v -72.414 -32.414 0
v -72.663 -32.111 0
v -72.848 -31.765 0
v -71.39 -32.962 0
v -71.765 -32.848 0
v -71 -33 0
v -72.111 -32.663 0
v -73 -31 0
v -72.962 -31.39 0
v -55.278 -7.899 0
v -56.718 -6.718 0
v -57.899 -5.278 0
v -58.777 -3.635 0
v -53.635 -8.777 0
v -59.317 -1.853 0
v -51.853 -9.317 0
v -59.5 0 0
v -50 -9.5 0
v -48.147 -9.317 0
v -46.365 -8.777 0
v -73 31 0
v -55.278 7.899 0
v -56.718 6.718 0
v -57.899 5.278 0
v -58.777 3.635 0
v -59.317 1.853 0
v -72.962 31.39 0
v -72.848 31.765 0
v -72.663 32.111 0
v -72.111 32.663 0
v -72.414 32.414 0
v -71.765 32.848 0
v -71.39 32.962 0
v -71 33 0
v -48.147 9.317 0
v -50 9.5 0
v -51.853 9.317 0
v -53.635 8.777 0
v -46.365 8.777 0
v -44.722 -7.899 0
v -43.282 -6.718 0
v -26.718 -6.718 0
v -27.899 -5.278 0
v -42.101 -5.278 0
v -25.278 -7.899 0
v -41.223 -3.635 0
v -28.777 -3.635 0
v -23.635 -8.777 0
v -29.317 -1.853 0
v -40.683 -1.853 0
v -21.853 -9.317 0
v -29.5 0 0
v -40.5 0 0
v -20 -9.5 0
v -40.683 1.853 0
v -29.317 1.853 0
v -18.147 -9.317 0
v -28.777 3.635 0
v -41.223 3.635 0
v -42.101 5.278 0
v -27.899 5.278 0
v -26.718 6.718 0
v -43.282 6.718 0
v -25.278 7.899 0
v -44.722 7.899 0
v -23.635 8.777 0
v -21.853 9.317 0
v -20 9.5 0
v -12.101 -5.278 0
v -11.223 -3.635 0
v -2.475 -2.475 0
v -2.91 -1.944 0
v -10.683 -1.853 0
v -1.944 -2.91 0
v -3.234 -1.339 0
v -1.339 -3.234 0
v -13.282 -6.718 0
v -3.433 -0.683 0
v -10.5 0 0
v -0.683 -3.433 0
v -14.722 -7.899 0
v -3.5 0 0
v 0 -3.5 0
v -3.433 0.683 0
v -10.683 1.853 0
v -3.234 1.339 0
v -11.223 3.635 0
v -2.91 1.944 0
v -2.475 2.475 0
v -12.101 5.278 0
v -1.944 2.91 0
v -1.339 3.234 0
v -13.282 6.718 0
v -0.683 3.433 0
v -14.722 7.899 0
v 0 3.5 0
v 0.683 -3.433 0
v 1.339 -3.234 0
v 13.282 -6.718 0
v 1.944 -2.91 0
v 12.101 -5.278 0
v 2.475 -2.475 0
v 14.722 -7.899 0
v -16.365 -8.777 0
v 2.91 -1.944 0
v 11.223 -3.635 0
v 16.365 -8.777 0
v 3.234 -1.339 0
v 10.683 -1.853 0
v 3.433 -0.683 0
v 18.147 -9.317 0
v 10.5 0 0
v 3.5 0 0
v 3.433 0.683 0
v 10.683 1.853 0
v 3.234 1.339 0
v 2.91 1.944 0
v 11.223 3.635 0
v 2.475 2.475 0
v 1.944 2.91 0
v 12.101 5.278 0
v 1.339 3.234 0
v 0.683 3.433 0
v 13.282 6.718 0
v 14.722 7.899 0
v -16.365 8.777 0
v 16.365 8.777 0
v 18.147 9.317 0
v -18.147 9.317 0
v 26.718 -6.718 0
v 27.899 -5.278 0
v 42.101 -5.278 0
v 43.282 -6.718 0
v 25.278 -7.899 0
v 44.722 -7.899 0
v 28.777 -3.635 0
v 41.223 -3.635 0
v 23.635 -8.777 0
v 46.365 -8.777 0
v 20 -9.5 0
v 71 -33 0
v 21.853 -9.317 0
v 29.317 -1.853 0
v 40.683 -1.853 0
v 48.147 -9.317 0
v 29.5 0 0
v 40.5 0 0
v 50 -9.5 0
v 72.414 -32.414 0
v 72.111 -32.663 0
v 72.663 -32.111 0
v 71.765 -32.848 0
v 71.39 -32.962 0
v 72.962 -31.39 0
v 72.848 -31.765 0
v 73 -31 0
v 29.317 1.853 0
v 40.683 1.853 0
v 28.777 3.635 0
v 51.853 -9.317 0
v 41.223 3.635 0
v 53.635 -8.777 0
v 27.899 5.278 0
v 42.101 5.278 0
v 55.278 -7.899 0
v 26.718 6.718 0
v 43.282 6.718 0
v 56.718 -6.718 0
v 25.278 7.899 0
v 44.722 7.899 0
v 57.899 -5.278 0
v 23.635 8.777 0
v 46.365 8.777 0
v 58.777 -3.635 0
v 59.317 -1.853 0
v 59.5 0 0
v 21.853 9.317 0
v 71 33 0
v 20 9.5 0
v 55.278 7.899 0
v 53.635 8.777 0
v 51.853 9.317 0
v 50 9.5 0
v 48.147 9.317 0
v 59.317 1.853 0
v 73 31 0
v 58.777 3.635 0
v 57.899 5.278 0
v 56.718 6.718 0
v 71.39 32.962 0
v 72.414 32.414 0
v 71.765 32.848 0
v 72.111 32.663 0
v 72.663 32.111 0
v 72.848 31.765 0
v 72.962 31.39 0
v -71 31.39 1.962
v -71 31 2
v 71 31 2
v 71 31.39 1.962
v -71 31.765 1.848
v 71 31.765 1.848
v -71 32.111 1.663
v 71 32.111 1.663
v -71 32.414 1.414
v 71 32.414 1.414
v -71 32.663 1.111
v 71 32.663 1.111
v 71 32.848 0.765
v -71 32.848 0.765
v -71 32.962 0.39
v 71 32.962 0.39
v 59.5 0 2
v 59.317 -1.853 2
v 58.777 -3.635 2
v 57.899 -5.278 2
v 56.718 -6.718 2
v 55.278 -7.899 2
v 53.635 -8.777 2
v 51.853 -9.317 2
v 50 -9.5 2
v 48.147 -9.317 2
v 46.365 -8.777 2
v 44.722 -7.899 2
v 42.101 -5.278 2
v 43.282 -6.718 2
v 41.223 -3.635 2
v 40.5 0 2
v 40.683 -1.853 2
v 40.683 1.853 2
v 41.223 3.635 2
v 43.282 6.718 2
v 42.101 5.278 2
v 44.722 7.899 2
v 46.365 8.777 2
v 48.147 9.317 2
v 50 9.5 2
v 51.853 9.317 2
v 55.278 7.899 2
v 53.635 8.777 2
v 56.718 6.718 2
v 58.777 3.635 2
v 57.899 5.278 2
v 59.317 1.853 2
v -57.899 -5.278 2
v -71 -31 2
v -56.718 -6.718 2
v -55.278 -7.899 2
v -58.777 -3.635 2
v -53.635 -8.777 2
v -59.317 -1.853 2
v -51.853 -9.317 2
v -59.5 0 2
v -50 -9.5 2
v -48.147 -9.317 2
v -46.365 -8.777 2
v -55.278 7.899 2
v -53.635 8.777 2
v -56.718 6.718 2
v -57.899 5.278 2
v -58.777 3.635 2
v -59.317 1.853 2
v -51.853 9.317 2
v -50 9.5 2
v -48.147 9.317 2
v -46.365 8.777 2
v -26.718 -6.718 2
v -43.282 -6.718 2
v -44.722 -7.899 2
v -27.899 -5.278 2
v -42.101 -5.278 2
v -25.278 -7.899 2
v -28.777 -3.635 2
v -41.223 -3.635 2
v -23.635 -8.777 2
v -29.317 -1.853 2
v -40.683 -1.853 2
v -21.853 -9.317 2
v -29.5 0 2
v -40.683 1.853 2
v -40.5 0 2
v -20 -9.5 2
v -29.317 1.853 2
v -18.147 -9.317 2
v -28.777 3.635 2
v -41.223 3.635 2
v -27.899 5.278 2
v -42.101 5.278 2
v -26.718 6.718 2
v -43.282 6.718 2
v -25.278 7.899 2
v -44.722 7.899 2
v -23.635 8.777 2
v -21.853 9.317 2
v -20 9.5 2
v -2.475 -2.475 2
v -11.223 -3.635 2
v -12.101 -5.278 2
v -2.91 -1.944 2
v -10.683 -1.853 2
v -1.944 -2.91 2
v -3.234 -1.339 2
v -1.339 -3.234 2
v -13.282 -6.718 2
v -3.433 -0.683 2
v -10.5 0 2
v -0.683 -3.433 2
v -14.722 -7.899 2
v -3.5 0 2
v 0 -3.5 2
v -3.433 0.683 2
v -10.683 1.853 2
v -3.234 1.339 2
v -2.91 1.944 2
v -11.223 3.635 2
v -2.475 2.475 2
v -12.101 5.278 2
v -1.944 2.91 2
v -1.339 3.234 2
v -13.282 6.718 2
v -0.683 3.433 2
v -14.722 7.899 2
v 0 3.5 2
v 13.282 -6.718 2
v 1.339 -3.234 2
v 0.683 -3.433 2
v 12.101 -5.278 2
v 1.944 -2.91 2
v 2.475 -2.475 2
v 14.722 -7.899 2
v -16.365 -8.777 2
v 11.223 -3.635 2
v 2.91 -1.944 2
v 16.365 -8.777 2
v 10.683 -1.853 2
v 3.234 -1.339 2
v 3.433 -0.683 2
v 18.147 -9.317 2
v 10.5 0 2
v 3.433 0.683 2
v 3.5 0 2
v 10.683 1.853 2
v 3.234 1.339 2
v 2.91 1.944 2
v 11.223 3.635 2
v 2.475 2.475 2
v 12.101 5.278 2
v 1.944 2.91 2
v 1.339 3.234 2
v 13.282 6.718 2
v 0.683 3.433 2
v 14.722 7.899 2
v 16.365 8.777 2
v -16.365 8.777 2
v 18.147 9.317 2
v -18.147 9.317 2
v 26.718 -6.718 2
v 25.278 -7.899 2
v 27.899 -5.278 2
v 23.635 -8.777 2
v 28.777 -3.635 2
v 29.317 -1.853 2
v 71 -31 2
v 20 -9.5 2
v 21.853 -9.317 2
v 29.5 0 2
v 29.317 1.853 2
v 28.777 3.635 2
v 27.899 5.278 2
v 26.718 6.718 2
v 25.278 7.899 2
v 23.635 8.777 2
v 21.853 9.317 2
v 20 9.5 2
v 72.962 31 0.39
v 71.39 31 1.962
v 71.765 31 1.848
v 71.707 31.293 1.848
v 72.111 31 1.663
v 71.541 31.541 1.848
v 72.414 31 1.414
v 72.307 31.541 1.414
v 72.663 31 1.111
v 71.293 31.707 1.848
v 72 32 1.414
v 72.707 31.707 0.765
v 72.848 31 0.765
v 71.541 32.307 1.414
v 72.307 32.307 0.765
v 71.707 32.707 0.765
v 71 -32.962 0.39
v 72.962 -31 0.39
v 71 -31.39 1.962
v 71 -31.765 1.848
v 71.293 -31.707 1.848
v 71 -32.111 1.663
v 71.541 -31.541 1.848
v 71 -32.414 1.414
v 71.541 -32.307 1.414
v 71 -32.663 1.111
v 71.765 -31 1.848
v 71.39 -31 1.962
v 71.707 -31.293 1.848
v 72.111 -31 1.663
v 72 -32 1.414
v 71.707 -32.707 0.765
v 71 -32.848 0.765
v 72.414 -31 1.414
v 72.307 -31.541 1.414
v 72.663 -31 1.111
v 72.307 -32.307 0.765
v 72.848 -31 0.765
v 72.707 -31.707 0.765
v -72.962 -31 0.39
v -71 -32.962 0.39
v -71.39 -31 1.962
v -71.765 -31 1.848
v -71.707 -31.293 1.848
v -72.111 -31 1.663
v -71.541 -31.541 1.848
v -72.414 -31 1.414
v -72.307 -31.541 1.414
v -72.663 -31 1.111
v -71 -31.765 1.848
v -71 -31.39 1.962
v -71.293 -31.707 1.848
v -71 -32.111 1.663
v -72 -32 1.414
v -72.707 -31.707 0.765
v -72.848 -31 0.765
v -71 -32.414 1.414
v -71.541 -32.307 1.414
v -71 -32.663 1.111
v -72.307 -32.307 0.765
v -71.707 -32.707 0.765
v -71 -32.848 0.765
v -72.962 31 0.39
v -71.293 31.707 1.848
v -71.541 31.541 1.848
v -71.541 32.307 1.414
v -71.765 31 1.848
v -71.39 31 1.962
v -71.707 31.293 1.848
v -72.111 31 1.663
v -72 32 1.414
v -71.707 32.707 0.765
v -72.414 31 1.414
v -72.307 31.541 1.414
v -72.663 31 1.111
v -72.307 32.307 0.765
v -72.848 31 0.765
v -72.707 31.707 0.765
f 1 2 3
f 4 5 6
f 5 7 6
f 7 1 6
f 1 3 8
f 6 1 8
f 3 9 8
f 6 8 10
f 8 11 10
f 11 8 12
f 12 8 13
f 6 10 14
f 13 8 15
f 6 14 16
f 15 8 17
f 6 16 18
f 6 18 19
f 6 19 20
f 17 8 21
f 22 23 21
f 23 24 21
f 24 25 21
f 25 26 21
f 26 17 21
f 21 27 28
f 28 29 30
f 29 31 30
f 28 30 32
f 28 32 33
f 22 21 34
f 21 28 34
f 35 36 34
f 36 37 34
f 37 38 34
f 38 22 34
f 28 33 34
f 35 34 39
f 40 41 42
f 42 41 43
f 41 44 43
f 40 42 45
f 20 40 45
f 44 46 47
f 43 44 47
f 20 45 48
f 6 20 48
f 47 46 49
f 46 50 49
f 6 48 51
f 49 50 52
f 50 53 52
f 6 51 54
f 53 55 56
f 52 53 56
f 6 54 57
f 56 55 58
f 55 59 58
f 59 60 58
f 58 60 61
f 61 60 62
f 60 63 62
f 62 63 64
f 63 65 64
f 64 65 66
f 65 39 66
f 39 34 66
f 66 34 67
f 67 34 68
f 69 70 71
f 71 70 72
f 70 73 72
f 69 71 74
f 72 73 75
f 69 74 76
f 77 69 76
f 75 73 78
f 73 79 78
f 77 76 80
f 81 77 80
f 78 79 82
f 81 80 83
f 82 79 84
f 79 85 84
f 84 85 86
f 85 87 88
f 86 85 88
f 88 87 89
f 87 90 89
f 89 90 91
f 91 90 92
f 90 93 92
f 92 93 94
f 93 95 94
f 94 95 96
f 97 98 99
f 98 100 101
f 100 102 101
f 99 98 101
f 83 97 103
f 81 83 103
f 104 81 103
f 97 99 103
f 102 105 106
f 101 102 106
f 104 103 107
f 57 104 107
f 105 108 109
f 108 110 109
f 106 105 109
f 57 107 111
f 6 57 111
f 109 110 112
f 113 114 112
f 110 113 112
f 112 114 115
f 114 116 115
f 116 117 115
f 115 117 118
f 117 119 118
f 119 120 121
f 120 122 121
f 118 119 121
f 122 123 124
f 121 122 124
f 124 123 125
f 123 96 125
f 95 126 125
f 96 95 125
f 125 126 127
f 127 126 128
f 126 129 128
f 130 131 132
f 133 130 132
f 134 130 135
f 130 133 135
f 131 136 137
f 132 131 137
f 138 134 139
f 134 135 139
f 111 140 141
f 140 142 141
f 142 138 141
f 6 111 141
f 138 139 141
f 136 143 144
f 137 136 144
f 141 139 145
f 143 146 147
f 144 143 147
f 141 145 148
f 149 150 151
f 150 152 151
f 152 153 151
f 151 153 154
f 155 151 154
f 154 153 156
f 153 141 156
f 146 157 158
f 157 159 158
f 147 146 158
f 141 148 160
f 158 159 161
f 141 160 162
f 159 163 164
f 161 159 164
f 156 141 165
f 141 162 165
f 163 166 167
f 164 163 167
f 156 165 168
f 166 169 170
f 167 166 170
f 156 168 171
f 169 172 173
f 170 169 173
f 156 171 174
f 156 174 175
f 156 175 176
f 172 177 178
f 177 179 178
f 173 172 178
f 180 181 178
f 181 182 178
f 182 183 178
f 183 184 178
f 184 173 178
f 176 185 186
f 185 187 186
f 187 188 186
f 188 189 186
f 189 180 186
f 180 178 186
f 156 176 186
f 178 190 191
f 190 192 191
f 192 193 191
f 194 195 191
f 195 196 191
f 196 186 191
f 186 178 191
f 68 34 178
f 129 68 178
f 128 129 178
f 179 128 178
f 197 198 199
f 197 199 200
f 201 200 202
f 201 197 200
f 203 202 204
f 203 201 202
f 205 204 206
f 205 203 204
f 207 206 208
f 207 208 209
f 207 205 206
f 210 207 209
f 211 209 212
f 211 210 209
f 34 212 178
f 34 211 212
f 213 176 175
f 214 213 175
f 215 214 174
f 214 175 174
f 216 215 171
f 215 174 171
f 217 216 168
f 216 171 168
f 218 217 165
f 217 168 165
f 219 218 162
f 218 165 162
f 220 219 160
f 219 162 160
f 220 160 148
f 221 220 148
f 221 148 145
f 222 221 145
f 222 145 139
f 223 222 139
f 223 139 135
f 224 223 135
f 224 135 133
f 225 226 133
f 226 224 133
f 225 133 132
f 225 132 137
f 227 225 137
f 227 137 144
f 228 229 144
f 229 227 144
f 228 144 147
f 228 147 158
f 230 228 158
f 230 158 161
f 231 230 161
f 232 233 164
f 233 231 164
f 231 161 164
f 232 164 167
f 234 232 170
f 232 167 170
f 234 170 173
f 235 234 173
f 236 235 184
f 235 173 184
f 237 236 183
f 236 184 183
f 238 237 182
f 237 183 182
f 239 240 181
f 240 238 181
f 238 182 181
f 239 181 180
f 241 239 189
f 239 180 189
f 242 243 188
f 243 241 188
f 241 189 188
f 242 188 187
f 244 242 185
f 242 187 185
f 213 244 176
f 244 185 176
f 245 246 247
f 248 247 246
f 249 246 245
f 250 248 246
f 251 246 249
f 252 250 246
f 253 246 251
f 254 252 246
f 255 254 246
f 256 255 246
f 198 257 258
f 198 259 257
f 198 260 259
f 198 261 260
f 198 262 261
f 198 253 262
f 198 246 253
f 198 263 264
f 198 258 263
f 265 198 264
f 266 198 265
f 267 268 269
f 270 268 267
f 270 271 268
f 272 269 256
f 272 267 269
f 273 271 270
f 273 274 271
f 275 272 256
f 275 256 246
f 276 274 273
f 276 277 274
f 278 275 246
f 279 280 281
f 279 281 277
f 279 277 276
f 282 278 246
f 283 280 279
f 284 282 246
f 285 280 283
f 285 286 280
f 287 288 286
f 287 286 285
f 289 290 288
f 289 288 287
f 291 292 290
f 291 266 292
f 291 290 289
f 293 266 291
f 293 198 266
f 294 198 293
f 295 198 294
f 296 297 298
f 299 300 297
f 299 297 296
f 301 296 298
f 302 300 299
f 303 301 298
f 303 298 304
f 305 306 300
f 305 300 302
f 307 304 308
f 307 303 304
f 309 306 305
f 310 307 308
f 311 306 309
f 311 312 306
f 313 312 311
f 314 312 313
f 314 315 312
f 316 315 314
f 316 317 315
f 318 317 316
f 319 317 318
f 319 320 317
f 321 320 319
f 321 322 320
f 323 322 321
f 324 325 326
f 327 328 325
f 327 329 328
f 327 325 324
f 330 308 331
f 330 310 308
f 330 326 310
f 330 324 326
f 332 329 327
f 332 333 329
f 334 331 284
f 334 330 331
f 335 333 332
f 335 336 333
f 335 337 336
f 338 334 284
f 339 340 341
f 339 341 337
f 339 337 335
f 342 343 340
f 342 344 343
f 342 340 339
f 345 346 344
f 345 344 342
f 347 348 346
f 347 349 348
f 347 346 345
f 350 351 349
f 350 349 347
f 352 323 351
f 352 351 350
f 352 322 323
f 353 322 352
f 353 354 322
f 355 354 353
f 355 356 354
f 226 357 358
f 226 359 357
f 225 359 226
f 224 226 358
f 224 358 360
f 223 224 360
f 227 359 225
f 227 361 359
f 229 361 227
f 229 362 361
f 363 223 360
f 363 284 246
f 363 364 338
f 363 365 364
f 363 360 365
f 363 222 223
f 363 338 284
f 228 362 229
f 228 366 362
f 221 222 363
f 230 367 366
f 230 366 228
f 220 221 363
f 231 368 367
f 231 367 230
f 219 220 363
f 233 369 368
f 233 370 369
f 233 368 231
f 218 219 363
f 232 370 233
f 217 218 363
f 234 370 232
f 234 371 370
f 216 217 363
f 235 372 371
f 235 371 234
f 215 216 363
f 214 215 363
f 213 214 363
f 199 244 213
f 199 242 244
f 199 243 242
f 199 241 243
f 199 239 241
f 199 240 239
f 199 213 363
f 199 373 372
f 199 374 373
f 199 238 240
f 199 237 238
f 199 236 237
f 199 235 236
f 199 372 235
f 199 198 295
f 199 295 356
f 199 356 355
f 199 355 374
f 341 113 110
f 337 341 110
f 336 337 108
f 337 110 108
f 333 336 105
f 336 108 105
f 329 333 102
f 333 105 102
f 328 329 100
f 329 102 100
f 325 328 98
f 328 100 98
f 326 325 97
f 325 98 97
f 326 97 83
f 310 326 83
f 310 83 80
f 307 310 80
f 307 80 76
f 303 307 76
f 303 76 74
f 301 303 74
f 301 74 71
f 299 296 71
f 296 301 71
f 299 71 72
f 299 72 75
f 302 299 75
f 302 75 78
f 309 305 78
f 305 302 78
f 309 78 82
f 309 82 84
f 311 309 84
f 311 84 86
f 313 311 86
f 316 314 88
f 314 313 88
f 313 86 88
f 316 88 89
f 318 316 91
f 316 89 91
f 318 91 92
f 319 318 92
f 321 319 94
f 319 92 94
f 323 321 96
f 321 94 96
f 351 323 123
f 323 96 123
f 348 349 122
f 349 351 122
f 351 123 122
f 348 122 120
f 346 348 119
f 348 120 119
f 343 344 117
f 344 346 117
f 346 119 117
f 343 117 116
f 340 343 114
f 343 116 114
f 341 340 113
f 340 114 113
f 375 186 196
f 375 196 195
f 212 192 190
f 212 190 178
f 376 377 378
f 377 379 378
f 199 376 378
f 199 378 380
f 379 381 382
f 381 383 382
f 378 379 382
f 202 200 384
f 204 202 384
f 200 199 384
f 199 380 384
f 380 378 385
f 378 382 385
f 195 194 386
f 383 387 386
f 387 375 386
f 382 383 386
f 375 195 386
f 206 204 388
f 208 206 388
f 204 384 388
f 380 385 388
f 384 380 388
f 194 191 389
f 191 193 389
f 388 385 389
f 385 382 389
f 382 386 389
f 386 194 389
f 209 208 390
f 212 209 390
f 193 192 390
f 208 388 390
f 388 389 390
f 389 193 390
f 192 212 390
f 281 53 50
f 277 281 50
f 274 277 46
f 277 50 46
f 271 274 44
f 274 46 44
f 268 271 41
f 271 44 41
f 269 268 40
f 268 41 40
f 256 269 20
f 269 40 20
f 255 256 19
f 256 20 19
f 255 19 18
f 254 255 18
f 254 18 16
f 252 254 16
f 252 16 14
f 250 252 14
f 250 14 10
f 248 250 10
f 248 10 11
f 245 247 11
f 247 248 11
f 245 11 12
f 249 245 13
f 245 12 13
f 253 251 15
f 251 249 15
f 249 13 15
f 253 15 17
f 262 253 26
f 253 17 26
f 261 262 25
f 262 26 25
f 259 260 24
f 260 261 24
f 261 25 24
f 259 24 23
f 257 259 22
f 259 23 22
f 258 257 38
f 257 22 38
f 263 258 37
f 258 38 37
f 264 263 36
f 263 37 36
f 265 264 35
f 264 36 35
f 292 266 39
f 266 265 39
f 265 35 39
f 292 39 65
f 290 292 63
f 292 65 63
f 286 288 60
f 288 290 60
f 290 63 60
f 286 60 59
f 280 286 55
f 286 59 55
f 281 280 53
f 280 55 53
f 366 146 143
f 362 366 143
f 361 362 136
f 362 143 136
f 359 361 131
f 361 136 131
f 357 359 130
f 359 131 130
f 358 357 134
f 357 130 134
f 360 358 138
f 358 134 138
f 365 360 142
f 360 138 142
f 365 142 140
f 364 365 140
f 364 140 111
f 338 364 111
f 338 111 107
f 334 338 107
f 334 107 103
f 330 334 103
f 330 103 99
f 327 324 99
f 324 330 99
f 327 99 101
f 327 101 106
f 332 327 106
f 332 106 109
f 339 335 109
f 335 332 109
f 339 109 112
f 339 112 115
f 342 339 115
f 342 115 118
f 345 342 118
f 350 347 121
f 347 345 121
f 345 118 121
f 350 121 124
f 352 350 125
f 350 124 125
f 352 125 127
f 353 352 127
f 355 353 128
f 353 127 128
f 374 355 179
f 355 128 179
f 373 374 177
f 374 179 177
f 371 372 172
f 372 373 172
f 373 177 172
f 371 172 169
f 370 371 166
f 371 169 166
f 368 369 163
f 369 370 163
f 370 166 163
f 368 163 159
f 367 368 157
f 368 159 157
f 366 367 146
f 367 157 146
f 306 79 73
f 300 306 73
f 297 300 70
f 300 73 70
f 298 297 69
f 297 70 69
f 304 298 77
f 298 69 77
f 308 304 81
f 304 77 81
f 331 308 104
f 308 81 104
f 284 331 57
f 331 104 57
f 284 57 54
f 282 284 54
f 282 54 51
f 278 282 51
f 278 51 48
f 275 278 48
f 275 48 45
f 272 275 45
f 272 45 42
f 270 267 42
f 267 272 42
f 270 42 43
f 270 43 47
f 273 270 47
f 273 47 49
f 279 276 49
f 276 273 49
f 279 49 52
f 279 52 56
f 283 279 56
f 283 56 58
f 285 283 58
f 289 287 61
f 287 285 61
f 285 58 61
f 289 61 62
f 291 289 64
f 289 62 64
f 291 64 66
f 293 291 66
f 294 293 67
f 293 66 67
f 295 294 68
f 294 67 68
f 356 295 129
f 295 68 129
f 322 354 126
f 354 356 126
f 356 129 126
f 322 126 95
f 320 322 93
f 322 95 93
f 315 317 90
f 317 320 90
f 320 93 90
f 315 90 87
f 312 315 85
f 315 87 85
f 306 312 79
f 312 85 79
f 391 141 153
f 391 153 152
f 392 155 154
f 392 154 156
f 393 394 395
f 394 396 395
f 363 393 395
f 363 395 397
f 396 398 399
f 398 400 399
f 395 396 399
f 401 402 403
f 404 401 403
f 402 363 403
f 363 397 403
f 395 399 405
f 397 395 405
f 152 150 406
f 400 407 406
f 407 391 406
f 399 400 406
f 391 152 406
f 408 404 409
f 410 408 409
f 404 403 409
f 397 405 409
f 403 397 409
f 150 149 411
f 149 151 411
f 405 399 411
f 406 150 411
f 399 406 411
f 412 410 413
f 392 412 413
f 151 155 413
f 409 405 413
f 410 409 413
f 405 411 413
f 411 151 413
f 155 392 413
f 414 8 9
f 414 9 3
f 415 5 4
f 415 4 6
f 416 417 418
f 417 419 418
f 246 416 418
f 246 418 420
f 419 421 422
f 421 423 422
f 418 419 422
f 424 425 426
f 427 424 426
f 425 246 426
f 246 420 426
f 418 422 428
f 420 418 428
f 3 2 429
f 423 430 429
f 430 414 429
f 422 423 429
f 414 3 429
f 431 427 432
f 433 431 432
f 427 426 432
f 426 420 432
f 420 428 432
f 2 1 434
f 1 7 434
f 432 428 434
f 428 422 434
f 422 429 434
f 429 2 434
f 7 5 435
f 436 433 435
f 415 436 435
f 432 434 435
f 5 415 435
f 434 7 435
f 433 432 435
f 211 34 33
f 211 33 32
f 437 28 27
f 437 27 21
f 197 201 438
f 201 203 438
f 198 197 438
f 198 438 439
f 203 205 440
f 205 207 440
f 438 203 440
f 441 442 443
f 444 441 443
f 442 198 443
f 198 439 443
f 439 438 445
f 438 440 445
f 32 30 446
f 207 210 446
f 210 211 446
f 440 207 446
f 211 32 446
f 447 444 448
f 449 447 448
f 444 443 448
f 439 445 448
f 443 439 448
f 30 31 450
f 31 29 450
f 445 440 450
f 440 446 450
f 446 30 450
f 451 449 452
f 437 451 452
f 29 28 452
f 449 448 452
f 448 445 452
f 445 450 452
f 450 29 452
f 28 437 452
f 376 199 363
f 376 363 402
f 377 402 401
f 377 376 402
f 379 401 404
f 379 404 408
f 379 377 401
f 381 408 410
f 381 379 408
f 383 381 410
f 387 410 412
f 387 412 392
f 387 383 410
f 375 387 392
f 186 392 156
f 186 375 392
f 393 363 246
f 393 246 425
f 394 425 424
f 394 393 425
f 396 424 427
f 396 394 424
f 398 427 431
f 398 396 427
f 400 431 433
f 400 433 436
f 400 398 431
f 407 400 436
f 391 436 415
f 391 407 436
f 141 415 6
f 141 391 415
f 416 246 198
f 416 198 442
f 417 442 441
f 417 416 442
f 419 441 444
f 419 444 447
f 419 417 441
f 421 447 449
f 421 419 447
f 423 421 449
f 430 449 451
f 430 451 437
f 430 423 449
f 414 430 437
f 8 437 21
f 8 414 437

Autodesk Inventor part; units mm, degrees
ref_plane "YZ Plane" through (0, 0, 0) normal (1, 0, 0) x (0, 1, 0)
ref_plane "XZ Plane" through (0, 0, 0) normal (0, 1, 0) x (-1, 0, 0)
ref_plane "XY Plane" through (0, 0, 0) normal (0, 0, 1) x (1, 0, 0)
sketch "Sketch1" plane through (0, 0, 0) normal (0, 0, 1) x (1, 0, 0)
  line L0 (-73, -33) -> (73, -33)
  line L1 (73, -33) -> (73, 33)
  line L2 (73, 33) -> (-73, 33)
  line L3 (-73, 33) -> (-73, -33)
  line L4 (-73, -33) -> (73, 33) construction
  line L5 (73, -33) -> (-73, 33) construction
  circle A0 centre (-20, 0) radius 9.5
  circle A1 centre (-50, 0) radius 9.5
  circle A2 centre (20, 0) radius 9.5
  circle A3 centre (50, 0) radius 9.5
  circle A4 centre (0, 0) radius 3.5
  dimension "d0" = 146
  dimension "d1" = 66
  dimension "d2" = 19
  dimension "d3" = 30
  dimension "d4" = 30
  dimension "d5" = 40
  dimension "d6" = 20
  dimension "d7" = 0
  dimension "d8" = 0
  dimension "d9" = 0
  dimension "d10" = 0
  dimension "d11" = 7
extrude "Extrusion1" add sketch "Sketch1" along normal blind 2
fillet "Fillet1" radius 2 4 edges at (0, -33, 2) (73, 0, 2) (0, 33, 2) (-73, 0, 2)
fillet "Fillet2" radius 2 4 edges at (-72.4142, -32.4142, 1.4142) (-72.4142, 32.4142, 1.4142) (72.4142, 32.4142, 1.4142) (72.4142, -32.4142, 1.4142)
equation "\"d4\" = d3"
properties part number "Cover"
